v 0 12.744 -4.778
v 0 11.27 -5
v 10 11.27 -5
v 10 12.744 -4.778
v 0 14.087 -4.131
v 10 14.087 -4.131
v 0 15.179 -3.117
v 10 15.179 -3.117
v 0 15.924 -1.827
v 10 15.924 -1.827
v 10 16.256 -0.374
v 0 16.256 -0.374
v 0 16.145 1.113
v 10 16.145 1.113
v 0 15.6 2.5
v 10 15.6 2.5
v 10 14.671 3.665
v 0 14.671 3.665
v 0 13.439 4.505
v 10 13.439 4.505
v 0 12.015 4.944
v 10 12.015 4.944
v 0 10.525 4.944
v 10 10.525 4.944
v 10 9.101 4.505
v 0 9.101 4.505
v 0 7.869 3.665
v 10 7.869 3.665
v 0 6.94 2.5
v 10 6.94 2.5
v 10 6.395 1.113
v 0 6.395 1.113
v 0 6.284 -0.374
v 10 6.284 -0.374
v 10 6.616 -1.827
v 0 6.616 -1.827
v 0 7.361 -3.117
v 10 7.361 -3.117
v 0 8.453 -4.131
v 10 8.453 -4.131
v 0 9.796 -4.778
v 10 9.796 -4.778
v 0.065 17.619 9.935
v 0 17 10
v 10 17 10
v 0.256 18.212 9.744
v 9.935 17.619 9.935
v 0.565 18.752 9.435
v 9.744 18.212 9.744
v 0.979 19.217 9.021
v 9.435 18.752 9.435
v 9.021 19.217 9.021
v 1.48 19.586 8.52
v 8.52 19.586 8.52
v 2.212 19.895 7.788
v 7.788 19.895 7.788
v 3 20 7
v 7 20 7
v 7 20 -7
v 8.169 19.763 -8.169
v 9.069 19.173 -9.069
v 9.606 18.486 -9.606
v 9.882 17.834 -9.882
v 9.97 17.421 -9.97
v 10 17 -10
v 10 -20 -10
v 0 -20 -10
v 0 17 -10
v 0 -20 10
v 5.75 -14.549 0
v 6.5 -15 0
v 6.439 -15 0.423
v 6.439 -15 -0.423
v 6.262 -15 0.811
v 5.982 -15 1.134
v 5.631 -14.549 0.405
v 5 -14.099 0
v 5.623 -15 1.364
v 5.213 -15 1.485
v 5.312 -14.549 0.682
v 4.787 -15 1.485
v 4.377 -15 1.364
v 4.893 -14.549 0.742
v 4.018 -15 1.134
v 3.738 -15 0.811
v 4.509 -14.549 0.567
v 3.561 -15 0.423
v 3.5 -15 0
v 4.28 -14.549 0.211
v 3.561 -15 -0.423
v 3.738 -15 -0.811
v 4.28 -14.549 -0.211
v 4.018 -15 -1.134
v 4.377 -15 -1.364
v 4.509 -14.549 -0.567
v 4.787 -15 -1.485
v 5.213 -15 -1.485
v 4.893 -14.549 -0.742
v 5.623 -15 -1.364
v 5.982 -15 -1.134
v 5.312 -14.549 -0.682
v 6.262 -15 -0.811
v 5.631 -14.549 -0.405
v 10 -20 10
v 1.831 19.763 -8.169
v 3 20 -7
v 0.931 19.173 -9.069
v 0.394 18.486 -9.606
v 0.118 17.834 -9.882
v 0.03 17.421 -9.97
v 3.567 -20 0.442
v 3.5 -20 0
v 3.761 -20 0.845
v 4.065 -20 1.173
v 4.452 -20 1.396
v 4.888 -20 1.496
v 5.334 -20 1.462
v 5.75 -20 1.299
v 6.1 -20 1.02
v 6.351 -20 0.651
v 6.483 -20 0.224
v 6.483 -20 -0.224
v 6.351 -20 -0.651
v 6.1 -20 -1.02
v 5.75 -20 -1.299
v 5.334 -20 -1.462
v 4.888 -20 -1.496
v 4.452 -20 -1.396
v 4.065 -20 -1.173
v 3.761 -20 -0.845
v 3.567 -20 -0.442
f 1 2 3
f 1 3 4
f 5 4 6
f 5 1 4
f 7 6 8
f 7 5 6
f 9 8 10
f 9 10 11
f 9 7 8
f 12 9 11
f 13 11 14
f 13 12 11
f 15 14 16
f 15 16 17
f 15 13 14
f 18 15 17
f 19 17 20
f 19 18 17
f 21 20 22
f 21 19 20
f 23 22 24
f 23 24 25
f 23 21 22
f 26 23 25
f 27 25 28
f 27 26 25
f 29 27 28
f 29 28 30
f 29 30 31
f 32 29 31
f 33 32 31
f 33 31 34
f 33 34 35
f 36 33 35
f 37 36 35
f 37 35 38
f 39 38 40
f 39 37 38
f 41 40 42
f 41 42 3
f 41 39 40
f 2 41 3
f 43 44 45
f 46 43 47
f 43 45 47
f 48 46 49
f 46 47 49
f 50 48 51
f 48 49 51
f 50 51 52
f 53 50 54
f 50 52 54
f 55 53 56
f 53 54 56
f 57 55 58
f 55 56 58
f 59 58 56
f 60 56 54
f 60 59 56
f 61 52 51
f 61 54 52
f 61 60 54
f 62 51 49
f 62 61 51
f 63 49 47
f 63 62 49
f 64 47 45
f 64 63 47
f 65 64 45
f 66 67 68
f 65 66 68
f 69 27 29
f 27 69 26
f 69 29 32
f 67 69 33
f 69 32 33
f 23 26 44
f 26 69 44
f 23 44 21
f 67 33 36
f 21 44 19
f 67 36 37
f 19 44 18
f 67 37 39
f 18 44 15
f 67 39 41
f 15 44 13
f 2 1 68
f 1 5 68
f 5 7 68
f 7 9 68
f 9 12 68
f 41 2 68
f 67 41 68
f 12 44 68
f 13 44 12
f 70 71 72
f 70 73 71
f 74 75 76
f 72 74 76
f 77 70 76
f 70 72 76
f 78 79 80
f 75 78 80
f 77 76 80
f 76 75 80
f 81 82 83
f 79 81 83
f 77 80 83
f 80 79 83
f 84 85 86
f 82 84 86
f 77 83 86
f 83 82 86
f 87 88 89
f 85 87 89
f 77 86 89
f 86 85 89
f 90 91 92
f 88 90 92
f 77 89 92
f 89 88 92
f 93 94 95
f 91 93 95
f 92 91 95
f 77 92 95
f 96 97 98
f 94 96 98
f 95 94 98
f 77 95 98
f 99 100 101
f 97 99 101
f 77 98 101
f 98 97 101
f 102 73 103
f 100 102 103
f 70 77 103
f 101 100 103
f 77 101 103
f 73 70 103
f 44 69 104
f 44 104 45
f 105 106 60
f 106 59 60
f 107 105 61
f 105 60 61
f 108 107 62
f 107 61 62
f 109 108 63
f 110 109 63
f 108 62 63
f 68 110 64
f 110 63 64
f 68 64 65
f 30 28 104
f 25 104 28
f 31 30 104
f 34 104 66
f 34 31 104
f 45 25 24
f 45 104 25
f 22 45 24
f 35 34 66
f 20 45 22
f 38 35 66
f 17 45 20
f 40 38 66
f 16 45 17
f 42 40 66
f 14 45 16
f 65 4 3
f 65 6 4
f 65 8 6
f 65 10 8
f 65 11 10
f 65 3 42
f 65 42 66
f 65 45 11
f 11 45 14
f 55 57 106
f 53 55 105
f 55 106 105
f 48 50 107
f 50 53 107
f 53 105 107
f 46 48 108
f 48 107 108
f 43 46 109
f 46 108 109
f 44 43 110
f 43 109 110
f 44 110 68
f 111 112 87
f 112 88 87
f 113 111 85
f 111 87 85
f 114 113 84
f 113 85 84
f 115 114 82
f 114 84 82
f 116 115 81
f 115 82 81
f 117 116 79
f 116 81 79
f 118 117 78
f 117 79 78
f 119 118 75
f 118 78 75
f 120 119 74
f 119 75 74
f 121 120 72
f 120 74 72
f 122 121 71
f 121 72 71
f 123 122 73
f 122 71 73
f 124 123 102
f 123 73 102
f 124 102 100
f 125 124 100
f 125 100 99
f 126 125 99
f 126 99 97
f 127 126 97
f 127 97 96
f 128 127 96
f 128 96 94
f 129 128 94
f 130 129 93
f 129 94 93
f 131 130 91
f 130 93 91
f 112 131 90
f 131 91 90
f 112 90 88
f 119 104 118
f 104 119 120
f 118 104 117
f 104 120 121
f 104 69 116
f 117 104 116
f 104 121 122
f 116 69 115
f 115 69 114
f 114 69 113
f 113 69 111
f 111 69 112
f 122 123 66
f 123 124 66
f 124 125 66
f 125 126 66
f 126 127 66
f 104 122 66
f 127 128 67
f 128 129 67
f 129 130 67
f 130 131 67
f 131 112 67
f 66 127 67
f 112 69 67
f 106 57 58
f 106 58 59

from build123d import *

# Parameters (mm, degrees)
SKETCH1_W                 = 20
SKETCH1_H                 = 40
SKETCH1_R                 = 5
BOSS_EXTRUDE1_DEPTH       = 10
FILLET1_R                 = 3
F_3_0MM_DOWEL_HOLE1_D     = 3
F_3_0MM_DOWEL_HOLE1_DEPTH = 5
F_3_0MM_DOWEL_HOLE1_TIP   = 0.901290929


with BuildPart() as part:
    # Sketch1 → Boss-Extrude1 (new body)
    with BuildSketch(Plane(origin=(0, 0, 0), x_dir=(0, 0, -1), z_dir=(1, 0, 0))):
        Rectangle(SKETCH1_W, SKETCH1_H)
        with Locations((0, 11.27)):
            Circle(SKETCH1_R, mode=Mode.SUBTRACT)
    extrude(amount=BOSS_EXTRUDE1_DEPTH)

    # Fillet1
    fillet1_edges = [part.edges().sort_by_distance(p)[0] for p in [
        (5, 20, 10),
        (5, 20, -10),
        (10, 20, 0),
        (0, 20, 0),
    ]]
    fillet(fillet1_edges, radius=FILLET1_R)

    # Ø3.0mm Dowel Hole1
    with Locations(Plane.XZ.offset(20)):
        with Locations((5, 0)):
            Hole(F_3_0MM_DOWEL_HOLE1_D / 2, depth=F_3_0MM_DOWEL_HOLE1_DEPTH)
            with Locations((0, 0, -(F_3_0MM_DOWEL_HOLE1_DEPTH + F_3_0MM_DOWEL_HOLE1_TIP / 2))):  # 118° drill point
                Cone(0, F_3_0MM_DOWEL_HOLE1_D / 2, F_3_0MM_DOWEL_HOLE1_TIP, mode=Mode.SUBTRACT)


solid = part.part
